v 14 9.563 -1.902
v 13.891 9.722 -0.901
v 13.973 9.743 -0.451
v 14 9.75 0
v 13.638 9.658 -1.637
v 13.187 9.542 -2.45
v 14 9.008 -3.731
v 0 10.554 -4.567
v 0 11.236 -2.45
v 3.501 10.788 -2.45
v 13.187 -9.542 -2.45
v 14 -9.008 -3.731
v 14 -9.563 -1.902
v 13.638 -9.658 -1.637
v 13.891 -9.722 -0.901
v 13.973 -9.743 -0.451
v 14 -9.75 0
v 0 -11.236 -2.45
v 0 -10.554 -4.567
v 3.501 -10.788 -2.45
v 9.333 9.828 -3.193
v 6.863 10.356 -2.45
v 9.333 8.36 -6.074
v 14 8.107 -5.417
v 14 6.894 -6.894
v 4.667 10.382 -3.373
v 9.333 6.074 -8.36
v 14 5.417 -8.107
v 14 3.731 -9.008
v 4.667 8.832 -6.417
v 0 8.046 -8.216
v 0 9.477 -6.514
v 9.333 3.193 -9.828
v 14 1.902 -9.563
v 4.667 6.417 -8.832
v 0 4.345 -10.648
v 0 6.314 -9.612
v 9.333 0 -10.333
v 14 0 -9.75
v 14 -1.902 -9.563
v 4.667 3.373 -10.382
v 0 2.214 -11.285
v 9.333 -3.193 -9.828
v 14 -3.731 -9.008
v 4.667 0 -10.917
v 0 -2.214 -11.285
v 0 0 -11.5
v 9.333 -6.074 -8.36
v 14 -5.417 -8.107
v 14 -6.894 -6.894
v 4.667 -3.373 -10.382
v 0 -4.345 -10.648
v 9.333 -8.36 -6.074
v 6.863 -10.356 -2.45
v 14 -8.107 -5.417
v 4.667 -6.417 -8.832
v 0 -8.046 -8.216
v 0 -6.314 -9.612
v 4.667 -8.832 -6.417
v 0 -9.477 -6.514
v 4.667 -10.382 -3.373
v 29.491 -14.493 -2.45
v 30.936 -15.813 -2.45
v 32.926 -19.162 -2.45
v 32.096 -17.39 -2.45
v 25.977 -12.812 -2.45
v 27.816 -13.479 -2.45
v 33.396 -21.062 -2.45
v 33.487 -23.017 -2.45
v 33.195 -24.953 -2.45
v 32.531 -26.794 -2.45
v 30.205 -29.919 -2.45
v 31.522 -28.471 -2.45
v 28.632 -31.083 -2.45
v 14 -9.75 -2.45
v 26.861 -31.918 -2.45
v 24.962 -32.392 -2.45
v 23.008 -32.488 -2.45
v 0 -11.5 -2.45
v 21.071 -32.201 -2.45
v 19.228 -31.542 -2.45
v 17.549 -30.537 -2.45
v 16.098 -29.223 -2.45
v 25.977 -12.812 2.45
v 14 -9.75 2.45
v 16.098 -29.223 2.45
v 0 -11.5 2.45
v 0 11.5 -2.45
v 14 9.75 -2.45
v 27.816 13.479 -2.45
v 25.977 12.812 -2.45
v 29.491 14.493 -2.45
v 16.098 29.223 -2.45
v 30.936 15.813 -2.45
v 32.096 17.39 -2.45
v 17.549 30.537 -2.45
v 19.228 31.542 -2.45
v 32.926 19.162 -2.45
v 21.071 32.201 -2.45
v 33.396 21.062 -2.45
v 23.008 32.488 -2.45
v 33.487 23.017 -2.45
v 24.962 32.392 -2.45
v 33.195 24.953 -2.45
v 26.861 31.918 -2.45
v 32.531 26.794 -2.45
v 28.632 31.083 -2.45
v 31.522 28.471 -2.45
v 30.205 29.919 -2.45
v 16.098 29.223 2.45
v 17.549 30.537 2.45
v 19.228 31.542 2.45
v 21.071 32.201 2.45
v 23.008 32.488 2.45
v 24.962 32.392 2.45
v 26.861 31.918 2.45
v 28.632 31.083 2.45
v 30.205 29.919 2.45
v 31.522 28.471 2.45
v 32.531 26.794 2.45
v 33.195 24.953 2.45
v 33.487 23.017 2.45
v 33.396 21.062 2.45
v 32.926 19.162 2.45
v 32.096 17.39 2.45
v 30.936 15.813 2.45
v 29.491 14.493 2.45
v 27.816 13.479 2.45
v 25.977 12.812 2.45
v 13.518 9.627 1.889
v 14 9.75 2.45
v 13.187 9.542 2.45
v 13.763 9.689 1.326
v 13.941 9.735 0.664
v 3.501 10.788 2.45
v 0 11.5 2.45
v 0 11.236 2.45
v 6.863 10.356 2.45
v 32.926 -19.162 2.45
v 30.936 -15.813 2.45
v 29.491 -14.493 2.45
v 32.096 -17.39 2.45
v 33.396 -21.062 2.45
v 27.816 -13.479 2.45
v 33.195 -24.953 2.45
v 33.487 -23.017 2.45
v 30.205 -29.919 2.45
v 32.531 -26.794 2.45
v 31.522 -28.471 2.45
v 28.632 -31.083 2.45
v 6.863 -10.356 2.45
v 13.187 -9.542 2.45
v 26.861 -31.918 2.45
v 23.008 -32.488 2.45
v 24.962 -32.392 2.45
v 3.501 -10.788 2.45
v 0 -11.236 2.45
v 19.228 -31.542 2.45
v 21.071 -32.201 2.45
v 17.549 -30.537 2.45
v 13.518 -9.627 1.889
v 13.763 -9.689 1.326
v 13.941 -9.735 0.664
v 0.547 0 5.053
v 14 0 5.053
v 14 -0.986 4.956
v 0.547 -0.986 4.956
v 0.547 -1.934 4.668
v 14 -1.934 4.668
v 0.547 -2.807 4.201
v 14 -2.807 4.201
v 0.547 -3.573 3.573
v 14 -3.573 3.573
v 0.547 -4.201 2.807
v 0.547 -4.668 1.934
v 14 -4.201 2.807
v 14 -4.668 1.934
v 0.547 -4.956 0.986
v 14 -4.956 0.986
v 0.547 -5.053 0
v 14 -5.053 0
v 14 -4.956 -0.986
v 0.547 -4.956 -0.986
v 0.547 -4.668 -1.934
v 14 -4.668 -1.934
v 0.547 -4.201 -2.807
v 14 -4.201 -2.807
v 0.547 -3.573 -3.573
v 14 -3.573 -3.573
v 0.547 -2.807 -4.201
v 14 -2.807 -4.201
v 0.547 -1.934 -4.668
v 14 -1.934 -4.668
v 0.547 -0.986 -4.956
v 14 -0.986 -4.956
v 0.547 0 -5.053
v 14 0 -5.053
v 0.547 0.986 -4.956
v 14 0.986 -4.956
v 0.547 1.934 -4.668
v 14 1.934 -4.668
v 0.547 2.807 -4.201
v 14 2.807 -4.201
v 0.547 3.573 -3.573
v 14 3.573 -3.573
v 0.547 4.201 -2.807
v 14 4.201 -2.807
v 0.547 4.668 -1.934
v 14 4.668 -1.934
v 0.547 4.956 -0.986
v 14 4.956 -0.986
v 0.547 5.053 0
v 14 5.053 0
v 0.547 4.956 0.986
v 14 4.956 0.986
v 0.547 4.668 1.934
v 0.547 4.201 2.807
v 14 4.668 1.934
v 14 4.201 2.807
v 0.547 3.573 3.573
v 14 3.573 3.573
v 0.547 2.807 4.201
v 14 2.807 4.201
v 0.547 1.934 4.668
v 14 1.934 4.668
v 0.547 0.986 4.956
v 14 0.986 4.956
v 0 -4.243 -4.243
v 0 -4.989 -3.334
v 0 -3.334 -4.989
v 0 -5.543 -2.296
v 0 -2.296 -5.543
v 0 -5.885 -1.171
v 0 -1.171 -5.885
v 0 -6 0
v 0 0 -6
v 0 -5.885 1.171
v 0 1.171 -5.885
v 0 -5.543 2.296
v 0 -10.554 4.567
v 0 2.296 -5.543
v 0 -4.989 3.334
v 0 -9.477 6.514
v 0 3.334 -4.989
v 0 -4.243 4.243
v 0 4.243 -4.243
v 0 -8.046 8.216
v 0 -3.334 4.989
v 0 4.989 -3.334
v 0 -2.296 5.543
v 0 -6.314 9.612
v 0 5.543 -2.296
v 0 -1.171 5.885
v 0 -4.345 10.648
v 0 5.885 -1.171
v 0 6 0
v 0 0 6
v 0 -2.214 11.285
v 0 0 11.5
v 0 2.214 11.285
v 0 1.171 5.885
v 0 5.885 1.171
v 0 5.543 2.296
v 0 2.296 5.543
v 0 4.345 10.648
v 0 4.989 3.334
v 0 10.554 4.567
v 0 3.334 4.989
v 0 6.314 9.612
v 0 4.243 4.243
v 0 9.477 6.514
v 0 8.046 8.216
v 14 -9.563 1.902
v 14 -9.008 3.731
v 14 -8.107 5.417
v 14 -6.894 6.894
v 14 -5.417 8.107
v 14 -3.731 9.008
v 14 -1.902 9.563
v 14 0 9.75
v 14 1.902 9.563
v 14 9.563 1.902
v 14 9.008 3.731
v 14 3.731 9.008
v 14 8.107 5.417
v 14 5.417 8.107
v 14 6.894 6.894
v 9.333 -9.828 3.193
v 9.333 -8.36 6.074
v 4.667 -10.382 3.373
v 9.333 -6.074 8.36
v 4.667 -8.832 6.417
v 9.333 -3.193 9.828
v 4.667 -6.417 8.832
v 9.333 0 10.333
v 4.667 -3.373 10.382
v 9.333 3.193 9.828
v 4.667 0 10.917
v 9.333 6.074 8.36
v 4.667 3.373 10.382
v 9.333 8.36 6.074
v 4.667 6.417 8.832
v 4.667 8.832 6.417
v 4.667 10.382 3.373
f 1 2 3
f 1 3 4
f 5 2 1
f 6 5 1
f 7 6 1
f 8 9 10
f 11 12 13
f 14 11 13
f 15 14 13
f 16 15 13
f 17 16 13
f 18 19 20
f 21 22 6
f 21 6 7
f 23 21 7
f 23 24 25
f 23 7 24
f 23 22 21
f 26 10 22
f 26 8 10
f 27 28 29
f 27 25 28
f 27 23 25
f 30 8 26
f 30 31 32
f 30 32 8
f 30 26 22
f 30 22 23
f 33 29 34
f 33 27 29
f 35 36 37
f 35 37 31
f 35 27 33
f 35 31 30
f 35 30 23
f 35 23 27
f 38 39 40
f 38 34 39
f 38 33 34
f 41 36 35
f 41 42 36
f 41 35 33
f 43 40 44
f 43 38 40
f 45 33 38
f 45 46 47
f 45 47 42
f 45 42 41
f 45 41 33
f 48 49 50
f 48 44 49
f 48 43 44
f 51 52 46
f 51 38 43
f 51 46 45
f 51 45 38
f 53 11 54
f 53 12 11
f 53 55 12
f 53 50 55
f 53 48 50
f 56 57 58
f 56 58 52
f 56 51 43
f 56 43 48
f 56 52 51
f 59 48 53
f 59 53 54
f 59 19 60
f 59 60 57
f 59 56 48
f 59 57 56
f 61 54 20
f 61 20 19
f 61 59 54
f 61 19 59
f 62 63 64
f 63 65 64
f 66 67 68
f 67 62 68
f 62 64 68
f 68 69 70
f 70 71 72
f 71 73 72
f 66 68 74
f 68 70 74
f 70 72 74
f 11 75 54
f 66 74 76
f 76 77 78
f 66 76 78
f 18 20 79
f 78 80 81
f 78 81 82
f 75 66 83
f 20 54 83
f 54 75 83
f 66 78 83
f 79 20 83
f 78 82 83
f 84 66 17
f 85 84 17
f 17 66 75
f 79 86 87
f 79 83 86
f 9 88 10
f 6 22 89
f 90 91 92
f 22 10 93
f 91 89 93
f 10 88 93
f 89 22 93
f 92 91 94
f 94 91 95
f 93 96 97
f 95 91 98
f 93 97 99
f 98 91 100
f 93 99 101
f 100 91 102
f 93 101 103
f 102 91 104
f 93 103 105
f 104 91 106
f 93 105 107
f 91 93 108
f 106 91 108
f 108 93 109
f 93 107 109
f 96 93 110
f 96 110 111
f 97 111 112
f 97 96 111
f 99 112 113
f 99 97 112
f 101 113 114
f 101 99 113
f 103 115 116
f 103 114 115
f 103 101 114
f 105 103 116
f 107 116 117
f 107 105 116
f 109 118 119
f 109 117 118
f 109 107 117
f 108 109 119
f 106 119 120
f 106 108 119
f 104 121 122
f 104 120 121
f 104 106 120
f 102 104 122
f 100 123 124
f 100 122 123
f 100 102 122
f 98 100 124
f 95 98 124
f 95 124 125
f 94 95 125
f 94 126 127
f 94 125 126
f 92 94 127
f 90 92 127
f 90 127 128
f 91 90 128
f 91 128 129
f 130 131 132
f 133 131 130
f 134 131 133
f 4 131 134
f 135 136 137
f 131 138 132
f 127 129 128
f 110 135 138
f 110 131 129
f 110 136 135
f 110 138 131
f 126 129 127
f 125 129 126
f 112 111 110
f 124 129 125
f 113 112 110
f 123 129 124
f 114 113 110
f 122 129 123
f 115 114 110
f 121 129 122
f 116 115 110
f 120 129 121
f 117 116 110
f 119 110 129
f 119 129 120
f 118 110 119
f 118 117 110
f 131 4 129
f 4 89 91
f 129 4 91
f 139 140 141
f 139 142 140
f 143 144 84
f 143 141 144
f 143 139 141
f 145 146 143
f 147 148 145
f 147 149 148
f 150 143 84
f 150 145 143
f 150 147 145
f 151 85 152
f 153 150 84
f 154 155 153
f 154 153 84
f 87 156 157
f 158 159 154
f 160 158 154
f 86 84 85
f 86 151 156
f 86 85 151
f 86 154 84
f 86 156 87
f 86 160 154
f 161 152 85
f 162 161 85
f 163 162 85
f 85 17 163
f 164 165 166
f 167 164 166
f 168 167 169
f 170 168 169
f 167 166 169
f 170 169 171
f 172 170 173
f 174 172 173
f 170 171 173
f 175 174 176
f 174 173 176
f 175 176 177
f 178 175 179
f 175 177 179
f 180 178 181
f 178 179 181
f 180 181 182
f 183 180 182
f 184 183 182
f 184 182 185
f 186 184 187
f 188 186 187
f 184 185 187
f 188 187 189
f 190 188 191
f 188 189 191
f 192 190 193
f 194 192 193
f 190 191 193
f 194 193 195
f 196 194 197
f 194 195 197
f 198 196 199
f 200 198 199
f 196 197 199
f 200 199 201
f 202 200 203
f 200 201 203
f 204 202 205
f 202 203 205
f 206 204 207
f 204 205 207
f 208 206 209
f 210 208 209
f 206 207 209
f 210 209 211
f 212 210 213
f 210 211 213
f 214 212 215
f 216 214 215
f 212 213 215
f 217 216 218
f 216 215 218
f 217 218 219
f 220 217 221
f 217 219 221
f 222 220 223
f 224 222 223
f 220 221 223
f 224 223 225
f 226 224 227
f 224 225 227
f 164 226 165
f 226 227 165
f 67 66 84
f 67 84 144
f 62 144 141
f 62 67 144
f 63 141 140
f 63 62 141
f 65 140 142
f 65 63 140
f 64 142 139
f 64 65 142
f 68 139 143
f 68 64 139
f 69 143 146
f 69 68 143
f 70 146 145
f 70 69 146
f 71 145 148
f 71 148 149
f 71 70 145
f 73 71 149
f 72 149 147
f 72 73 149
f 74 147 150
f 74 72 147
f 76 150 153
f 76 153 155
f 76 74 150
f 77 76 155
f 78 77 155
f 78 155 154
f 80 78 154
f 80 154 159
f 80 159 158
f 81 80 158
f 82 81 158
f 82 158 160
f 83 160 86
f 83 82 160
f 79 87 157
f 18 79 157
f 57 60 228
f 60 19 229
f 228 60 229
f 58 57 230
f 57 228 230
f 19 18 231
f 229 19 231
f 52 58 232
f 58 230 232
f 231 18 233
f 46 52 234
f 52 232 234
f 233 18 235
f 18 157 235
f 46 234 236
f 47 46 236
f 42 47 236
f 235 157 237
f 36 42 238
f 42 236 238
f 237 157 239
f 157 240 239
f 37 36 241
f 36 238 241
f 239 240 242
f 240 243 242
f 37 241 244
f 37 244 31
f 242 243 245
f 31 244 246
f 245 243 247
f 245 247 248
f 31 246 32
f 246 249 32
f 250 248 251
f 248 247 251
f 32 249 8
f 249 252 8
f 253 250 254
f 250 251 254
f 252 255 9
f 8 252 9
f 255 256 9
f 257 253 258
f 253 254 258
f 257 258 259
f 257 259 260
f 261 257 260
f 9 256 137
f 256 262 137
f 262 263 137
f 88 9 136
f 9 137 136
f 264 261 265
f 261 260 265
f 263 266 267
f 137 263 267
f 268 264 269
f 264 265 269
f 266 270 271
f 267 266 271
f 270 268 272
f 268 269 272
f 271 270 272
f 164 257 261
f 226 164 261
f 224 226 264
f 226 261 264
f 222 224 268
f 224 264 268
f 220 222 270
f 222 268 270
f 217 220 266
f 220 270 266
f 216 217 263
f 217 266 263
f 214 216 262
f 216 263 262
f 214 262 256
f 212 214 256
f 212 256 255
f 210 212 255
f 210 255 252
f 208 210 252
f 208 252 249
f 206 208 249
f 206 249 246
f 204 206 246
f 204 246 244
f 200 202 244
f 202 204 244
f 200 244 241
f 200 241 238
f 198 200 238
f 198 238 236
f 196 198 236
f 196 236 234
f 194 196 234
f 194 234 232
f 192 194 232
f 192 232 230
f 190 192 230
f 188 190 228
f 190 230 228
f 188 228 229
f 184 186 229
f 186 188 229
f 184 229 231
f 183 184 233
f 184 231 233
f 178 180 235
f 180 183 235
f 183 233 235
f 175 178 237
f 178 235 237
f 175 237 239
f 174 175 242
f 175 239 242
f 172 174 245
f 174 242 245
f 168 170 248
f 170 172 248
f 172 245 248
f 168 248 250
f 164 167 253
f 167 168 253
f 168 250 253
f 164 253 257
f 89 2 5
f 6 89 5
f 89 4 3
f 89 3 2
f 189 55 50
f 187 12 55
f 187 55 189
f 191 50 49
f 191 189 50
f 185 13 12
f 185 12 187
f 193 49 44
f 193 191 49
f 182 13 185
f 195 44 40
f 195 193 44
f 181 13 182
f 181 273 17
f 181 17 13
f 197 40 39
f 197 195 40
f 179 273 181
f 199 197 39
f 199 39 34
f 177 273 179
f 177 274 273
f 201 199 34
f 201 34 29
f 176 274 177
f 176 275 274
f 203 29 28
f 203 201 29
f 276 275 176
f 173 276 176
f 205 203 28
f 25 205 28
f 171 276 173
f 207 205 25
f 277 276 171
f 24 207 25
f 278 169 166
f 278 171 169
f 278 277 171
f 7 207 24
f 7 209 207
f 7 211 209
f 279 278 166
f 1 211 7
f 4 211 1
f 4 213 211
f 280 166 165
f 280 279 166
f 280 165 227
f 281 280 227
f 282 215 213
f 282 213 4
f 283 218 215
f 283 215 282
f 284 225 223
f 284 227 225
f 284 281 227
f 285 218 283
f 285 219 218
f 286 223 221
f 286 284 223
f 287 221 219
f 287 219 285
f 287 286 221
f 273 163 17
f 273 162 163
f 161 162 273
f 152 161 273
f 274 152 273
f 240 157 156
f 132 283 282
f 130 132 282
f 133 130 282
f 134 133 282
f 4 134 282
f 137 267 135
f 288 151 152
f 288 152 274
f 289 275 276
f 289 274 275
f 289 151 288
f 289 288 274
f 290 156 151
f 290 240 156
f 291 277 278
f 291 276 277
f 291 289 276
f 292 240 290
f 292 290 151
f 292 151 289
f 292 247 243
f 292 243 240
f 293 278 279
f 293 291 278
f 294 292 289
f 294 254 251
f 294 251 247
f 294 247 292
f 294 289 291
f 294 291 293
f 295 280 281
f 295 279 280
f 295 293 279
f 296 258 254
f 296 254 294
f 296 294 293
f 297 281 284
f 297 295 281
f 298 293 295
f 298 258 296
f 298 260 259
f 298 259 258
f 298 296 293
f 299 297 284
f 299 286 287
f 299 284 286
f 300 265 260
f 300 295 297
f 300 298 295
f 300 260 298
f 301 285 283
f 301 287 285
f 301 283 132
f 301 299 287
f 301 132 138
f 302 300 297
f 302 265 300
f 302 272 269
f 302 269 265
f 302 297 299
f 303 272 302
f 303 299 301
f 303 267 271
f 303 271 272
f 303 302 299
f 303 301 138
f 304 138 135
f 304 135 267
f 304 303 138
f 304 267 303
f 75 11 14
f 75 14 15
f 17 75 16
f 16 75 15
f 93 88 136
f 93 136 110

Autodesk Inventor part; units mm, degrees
ref_plane "YZ Plane" through (0, 0, 0) normal (1, 0, 0) x (0, 1, 0)
ref_plane "XZ Plane" through (0, 0, 0) normal (0, 1, 0) x (-1, 0, 0)
sketch "Skizze1" plane through (0, 0, 0) normal (0, 0, 1) x (1, 0, 0)
  line L0 (0, 0) -> (14, 0)
  line L1 (0, 0) -> (0, 11.5)
  line L2 (14, 9.75) -> (14, 0)
  line L3 (0, 11.5) -> (16.0976, 29.2234)
  line L4 (14, 9.75) -> (25.9766, 12.8115)
  arc A0 (25.9766, 12.8115) -> (16.0976, 29.2234) centre (23.5, 22.5) ccw
  line L5 (14, 9.75) -> (0, 11.5)
  line L6 (14, 9.75) -> (0, 6.1712)
  dimension "d0" = 19.5
  dimension "d1" = 23.5
  dimension "d2" = 22.5
  dimension "d3" = 10
  dimension "d4" = 14
  dimension "d5" = 23
revolve "Körper" add sketch "Skizze1" angle 360 about axis through (0, 0, 0) along (1, 0, 0) contours L1 L6 L2 L0 | L1 L5 L6
extrude "Flügel1" add sketch "Skizze1" along normal mid plane 4.9 contours L1 L5 L6 | L5 L3 A0 L4
fillet "Rundung1" [suppressed]
mirror "Flügel2" about plane through (0, 0, 0) normal (0, 1, 0) of "Flügel1"
sketch "Skizze2" plane through (0, 0, 0) normal (1, 0, 0) x (0, 1, 0)
  line L0 (0, -14) -> (0, 14) projected
  line L1 (-14, 0) -> (14, 0) projected
  point P0 (0, 0)
hole "Gewinde" at (0, 0, 0) direction (1, 0, 0) diameter 10.106 end through all thread size "M12x1.75" class "6H" standard "ISO Metric profile"
chamfer "Fase1" distance 0.9472 angle 30 1 edges at (0, 0, -5.053) measured on face at (0, -9.1627, 0.203)
ref_plane "Work Plane1" through (76.6567, 0, 0) normal (0, 0, -1) x (1, 0, 0)
equation "\"d0\" = KOD2"
equation "\"d1\" = KOH1 - RR"
equation "\"d2\" = 0.5 * E0 - RR"
equation "\"d3\" = RR"
equation "\"d4\" = KOH"
equation "\"d5\" = KOD"
equation "\"d6\" = SW"
equation "\"d8\" = 0.333333 * SW"
equation "\"d9\" = -0.5 * GD1 + 0.5 * NND"
equation "\"d109\" = -0.5 * GD1 + 0.5 * NND"
equation "\"NND\" = 12"
equation "\"KOH\" = 14"
equation "\"KOH1\" = 33.5"
equation "\"SW\" = 4.9"
equation "\"KOD\" = 23"
equation "\"KOD2\" = 19.5"
equation "\"RR\" = 10"
equation "\"E0\" = 65"
equation "\"GUL\" = 0.541266 * PTC"
equation "\"BOR\" = 0"
equation "\"PTC\" = 1.75"
equation "\"THREADDIA\" = 12"
equation "\"TOA\" = 30deg"
equation "\"RR2\" = 6"
equation "\"SW1\" = 6.4"
equation "\"GAL\" = 0.541266 * PTC"
equation "\"GD1\" = 10.105569"
properties part number "DIN 315 - M12" material "Steel, Mild"
